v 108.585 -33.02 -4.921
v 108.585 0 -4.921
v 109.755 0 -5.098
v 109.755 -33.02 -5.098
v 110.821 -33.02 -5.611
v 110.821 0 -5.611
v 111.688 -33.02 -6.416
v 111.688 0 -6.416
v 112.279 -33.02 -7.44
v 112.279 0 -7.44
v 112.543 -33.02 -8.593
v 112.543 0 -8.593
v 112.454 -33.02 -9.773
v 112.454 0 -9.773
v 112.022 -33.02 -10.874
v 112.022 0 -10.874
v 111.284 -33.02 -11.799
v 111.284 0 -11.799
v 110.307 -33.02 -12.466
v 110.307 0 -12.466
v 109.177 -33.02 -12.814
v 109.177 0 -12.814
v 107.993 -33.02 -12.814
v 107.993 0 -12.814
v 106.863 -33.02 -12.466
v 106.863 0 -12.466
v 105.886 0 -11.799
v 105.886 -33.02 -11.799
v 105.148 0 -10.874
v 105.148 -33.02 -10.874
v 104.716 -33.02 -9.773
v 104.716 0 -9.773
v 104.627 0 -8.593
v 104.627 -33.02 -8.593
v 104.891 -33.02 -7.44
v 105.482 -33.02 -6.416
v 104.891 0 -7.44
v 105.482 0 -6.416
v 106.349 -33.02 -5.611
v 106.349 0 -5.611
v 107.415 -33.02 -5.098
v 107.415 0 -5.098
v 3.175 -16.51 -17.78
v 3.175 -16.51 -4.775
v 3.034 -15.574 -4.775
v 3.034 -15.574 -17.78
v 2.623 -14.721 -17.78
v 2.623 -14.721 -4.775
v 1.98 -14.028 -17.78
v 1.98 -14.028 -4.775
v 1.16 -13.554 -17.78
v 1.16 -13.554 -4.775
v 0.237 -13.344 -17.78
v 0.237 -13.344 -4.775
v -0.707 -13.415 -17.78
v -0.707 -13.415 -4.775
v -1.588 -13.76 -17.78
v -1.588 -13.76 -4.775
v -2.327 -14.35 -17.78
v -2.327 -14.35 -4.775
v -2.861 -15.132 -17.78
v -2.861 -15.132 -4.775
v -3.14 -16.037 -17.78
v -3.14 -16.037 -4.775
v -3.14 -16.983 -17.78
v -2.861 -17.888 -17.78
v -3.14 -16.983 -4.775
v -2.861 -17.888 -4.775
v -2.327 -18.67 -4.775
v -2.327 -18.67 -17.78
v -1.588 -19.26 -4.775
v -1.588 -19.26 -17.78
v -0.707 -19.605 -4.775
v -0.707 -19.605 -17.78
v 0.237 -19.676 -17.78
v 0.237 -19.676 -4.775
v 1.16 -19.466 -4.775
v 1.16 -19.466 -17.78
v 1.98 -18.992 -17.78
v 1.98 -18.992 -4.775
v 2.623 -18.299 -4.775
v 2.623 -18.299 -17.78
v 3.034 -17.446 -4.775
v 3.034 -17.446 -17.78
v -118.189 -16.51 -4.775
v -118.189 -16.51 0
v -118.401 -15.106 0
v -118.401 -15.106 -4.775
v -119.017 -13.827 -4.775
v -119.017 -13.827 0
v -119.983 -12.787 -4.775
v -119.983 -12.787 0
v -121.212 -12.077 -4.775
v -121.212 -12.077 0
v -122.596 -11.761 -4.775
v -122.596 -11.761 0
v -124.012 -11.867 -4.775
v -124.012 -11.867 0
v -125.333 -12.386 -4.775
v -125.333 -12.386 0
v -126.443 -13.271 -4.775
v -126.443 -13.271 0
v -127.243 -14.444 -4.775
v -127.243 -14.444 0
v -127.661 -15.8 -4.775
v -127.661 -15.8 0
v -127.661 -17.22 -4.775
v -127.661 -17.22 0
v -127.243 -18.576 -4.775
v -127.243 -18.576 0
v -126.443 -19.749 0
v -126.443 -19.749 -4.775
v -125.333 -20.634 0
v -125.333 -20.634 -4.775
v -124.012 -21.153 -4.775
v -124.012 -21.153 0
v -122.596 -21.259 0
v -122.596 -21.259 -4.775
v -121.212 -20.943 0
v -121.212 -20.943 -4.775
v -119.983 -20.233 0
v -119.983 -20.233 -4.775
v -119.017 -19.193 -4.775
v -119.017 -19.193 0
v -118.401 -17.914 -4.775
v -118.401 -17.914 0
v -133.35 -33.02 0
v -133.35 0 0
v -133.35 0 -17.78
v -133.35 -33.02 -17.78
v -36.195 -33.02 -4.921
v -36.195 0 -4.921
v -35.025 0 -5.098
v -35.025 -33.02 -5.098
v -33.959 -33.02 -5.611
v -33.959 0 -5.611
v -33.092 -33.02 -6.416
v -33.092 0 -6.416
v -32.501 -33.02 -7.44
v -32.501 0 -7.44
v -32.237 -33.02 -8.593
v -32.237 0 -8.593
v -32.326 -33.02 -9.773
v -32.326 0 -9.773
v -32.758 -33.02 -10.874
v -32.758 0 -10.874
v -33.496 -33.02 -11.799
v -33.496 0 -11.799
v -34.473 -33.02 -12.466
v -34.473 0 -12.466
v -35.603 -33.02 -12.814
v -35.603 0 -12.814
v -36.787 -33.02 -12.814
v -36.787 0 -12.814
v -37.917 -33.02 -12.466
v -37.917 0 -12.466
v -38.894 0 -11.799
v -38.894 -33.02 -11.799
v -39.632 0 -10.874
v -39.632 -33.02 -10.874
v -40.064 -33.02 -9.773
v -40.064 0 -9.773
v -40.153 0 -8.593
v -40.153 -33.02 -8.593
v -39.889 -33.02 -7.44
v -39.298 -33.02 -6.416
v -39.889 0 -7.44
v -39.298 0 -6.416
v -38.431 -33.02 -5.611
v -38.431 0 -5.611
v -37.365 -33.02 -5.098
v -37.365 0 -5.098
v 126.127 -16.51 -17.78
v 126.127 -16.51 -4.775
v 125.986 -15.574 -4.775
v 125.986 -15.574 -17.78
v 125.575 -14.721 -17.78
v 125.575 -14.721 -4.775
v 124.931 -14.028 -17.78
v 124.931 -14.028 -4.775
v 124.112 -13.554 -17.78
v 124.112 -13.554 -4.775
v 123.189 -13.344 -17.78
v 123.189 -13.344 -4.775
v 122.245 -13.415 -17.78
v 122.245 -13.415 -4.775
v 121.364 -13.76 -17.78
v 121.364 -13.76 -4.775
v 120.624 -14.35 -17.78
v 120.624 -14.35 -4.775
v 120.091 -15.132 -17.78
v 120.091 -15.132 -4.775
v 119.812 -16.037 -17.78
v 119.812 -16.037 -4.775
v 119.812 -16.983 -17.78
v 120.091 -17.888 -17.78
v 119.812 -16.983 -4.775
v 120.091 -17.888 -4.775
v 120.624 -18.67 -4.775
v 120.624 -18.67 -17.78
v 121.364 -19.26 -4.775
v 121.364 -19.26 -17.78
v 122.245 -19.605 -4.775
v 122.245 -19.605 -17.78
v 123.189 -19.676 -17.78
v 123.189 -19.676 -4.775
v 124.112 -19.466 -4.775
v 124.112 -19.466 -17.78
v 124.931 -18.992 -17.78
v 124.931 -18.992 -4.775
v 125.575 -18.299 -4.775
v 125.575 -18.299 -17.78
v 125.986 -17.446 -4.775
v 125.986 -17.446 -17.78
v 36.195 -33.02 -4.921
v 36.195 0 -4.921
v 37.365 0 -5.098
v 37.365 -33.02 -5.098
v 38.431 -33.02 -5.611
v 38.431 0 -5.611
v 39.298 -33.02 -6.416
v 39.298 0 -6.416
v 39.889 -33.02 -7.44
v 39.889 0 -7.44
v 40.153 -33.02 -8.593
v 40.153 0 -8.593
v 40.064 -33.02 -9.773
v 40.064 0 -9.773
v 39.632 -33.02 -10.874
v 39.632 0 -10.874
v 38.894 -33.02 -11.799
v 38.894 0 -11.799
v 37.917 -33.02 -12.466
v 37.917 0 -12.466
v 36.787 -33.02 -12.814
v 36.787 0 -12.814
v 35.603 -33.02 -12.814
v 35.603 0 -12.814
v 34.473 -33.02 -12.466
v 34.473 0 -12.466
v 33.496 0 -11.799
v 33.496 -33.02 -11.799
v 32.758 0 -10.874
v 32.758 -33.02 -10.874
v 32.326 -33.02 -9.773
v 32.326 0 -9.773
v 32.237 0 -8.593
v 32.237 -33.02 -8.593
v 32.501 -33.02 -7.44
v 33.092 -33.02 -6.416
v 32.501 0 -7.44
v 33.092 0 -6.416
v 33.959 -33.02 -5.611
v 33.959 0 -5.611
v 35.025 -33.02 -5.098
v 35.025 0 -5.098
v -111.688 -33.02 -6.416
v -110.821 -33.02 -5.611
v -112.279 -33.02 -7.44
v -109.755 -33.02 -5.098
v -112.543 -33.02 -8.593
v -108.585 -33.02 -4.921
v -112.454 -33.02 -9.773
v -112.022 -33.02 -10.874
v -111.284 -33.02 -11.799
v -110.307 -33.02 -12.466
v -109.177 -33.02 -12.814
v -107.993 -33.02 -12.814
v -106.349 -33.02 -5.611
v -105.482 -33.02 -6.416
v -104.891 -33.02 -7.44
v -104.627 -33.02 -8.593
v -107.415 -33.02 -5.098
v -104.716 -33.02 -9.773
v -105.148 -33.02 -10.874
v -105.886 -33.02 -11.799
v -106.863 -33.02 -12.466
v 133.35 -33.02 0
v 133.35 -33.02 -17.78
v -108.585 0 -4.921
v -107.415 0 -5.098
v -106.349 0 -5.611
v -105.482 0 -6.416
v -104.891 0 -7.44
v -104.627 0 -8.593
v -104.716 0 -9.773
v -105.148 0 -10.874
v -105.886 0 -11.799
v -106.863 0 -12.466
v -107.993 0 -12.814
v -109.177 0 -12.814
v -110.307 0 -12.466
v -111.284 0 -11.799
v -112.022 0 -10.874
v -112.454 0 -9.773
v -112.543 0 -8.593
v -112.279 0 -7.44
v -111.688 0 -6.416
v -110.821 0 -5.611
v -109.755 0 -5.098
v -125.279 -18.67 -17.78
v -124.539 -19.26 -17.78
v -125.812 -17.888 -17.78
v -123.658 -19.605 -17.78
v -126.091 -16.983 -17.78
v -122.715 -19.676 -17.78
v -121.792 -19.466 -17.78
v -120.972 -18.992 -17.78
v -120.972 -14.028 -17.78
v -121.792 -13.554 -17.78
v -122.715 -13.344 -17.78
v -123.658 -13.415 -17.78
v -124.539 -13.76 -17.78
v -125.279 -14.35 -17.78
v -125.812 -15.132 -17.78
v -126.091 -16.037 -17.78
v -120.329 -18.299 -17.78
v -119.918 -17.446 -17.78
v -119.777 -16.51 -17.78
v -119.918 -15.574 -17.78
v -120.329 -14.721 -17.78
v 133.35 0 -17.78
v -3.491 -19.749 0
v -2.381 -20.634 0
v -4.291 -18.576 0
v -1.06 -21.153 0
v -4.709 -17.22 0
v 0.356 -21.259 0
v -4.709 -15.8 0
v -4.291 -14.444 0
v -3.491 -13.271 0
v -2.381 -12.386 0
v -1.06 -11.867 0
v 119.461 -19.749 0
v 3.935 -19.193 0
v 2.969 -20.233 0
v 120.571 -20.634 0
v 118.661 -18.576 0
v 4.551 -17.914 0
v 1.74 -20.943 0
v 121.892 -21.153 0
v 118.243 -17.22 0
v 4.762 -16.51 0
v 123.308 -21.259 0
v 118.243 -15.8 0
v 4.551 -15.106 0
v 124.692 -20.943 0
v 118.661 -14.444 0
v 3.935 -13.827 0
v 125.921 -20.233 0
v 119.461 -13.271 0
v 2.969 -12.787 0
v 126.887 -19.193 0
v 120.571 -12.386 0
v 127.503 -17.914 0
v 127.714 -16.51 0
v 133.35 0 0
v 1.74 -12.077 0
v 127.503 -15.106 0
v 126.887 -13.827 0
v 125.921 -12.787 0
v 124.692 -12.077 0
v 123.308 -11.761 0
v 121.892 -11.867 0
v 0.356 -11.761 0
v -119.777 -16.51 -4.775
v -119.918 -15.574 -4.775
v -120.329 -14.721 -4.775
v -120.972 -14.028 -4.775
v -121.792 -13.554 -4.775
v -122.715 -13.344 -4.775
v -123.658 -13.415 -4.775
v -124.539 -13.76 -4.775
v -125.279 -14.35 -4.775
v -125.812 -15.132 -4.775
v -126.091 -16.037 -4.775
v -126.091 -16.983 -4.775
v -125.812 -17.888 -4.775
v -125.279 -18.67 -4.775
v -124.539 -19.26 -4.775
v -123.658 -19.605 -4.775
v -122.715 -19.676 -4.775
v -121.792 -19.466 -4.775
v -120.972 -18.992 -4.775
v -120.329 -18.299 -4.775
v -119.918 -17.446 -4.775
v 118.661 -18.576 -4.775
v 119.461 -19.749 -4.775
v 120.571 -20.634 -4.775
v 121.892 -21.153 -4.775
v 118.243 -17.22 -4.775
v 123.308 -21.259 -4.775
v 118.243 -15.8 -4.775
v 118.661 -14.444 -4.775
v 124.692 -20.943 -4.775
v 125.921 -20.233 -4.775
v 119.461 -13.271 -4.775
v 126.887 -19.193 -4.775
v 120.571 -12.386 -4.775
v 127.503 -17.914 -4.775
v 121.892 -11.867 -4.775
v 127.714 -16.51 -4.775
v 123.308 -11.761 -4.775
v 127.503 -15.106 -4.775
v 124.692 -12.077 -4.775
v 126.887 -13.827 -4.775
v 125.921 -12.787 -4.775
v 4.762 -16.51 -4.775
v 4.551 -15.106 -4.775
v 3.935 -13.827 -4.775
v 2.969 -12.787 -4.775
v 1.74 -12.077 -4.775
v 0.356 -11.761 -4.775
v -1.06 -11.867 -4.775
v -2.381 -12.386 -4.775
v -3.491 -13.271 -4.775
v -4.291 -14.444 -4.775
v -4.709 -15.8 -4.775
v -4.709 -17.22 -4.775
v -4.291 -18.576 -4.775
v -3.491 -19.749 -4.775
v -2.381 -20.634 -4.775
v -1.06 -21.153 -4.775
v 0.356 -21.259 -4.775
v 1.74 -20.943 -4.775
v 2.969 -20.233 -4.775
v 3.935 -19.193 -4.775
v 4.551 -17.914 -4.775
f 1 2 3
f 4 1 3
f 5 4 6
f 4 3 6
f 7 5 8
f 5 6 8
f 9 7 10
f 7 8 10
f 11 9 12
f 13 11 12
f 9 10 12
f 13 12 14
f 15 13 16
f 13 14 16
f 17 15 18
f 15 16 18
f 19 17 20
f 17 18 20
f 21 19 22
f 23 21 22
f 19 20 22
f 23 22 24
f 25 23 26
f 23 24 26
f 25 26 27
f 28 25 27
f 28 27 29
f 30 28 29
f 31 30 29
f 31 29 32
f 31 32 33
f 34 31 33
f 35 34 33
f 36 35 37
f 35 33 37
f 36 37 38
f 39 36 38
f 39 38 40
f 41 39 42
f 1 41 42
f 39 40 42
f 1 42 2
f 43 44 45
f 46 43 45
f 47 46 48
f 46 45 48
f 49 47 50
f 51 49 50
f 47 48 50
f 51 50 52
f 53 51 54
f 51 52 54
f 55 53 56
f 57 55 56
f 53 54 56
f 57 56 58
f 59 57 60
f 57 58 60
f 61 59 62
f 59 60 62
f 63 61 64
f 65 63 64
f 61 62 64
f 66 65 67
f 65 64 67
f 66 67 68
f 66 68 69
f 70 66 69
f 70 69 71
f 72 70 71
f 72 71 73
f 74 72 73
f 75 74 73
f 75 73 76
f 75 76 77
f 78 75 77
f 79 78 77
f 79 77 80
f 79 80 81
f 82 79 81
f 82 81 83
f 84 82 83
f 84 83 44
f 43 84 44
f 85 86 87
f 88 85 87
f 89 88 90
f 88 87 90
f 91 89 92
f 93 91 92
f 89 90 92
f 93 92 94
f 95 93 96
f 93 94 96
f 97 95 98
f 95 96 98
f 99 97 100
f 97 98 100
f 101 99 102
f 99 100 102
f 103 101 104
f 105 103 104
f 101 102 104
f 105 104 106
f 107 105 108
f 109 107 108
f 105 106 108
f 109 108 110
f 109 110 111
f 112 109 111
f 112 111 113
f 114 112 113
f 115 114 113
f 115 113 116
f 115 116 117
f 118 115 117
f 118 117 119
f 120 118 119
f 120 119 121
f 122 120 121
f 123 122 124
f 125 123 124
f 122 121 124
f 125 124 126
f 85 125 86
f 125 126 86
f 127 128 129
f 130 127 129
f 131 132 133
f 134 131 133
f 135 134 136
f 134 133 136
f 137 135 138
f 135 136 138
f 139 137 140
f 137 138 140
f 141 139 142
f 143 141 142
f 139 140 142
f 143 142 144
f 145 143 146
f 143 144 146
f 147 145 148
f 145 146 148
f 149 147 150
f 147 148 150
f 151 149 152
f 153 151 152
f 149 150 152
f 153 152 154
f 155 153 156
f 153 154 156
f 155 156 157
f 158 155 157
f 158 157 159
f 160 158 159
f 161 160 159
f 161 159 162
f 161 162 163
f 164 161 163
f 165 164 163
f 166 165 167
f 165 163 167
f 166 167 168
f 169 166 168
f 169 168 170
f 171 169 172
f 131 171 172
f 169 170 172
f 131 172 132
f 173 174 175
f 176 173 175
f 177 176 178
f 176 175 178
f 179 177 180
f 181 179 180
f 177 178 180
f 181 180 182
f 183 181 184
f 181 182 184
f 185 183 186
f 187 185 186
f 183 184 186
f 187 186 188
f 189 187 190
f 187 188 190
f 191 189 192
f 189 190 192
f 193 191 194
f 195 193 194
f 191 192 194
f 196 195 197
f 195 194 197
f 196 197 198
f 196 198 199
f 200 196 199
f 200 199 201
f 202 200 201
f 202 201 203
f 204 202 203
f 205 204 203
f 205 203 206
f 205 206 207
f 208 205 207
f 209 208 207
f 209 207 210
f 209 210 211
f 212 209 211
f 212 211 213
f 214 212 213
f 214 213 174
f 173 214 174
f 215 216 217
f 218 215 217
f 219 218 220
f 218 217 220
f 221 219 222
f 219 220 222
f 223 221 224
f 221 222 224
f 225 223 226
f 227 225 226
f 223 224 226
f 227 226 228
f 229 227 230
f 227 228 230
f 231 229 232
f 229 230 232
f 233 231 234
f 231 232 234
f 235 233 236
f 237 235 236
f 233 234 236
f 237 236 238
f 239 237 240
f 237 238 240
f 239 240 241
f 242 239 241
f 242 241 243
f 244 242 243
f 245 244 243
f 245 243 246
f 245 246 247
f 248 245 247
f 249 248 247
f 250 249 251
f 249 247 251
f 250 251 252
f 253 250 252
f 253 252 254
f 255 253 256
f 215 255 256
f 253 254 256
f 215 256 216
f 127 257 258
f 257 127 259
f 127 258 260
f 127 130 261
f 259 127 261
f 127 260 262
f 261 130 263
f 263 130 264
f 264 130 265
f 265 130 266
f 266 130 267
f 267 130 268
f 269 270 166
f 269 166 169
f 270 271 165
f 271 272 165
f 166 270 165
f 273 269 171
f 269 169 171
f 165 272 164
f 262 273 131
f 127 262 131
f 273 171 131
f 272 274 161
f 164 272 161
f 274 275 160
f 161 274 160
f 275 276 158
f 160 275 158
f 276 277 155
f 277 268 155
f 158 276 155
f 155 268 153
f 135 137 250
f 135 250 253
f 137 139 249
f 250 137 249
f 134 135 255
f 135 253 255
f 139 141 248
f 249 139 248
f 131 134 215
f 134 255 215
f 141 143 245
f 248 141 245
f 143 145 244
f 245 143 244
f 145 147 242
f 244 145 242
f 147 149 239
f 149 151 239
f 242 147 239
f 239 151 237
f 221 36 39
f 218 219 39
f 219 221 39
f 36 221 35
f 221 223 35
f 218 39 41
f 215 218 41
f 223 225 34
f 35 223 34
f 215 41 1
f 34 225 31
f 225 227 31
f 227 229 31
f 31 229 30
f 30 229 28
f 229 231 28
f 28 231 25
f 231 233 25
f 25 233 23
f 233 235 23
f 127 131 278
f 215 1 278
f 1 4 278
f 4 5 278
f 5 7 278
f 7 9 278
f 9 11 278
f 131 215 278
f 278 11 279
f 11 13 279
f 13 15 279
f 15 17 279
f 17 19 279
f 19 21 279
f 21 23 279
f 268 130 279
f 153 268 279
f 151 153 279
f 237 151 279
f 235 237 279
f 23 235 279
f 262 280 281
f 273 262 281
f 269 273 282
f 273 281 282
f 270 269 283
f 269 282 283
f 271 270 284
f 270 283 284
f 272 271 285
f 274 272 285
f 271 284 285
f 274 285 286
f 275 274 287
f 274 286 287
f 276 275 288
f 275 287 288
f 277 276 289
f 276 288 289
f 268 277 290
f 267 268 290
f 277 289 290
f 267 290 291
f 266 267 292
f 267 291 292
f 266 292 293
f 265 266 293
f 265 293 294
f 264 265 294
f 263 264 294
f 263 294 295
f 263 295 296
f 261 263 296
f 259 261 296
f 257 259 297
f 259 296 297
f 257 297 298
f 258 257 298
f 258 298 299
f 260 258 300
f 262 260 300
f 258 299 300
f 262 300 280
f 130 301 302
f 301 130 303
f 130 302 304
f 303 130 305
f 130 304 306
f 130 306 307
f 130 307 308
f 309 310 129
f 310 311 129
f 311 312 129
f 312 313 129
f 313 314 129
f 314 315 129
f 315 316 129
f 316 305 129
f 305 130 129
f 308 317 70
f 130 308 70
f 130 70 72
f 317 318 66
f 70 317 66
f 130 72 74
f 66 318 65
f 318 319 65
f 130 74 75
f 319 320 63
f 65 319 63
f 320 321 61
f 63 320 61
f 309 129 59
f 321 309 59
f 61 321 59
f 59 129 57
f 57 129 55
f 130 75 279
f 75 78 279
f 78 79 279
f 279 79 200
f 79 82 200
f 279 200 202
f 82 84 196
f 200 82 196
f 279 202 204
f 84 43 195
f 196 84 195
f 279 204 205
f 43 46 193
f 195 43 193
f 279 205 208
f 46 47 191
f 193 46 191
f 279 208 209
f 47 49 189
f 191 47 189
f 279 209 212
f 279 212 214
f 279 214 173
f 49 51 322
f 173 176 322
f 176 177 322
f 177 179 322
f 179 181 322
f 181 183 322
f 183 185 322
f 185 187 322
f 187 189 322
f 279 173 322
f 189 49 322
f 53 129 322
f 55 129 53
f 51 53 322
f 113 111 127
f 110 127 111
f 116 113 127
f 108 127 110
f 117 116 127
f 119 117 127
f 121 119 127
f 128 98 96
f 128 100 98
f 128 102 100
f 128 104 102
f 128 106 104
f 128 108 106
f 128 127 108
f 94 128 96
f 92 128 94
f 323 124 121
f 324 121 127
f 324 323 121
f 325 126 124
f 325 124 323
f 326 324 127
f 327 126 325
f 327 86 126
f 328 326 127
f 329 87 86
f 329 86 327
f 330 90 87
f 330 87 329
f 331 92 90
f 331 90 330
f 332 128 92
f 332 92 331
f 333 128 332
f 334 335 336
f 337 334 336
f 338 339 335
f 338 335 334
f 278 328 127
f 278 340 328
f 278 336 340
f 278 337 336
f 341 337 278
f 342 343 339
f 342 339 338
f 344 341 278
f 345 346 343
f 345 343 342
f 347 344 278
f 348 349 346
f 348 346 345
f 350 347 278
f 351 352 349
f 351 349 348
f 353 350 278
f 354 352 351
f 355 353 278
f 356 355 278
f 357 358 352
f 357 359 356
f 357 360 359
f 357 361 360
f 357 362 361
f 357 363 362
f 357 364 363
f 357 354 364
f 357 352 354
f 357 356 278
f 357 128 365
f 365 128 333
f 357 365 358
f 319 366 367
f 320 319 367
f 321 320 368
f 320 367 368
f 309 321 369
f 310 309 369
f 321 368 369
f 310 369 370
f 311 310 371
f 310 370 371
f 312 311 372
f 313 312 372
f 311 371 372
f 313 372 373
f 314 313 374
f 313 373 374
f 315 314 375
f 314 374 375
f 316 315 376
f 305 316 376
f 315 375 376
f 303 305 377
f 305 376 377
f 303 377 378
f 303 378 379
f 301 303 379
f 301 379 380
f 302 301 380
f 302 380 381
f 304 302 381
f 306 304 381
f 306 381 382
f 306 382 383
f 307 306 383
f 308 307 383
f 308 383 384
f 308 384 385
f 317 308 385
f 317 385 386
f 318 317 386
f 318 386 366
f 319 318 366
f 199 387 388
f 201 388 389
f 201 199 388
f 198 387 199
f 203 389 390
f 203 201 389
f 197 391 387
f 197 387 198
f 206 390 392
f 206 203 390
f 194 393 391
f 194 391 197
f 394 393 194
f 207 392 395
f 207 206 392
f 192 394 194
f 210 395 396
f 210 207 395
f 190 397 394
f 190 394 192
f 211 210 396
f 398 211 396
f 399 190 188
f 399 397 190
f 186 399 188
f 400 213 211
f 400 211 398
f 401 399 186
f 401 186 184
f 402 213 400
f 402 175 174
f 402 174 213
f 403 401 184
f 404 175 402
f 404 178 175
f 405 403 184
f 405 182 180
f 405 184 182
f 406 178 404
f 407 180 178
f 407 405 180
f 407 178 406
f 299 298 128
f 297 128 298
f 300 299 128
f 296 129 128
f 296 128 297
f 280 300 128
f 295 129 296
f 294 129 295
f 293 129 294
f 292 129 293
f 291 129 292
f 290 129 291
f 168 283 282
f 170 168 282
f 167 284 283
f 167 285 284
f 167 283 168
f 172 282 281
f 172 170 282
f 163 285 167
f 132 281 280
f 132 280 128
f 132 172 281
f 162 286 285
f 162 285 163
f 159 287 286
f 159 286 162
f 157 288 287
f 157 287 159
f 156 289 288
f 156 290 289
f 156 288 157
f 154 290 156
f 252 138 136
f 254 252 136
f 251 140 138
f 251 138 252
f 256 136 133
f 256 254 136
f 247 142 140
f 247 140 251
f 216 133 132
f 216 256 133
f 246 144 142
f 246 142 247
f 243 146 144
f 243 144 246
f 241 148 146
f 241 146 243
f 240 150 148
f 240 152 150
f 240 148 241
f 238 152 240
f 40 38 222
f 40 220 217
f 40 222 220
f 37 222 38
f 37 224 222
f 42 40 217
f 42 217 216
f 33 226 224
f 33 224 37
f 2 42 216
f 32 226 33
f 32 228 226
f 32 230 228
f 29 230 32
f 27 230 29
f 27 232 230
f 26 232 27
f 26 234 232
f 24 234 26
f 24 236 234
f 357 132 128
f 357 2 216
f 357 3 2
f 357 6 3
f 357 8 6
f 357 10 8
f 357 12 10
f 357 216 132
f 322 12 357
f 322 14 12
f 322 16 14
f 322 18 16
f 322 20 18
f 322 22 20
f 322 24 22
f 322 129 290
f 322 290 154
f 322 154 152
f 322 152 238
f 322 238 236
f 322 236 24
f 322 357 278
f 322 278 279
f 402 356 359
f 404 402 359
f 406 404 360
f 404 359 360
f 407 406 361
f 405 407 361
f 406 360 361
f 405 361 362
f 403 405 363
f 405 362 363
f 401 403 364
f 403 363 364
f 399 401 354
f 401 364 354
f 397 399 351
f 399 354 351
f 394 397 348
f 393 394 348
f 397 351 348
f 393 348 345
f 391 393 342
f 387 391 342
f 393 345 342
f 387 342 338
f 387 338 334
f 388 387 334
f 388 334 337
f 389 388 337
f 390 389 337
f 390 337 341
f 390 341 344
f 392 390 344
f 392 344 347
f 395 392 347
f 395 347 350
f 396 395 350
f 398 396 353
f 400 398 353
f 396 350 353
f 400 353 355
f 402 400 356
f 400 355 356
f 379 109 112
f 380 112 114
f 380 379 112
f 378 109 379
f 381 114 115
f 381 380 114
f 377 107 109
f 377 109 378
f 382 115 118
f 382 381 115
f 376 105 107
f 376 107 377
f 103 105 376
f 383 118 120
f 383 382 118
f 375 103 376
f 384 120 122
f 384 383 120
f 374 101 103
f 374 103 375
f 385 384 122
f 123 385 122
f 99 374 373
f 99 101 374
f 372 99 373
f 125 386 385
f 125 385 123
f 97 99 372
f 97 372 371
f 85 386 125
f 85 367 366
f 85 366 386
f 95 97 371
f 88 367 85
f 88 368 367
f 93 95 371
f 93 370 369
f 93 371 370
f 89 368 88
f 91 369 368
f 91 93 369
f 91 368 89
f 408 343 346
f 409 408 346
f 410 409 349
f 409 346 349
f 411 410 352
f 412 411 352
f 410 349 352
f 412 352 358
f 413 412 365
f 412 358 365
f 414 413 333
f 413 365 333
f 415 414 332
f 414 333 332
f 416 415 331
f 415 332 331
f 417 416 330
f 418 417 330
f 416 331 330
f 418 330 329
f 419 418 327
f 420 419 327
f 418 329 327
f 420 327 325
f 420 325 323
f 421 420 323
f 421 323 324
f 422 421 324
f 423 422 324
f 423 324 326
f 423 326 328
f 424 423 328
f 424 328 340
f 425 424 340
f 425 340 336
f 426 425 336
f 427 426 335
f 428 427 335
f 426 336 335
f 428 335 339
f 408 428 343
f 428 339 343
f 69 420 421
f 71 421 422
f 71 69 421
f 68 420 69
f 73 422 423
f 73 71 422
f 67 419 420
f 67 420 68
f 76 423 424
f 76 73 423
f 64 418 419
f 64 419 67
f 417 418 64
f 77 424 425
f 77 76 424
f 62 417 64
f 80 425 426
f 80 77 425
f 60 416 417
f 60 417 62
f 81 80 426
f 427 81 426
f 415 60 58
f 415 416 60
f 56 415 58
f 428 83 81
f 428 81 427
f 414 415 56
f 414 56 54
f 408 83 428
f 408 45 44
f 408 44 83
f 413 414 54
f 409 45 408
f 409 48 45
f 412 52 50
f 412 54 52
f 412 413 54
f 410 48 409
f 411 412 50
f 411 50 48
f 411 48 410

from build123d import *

# Parameters (mm, degrees)
SKETCH1_W           = 266.7
SKETCH1_H           = 17.78
SKETCH1_R           = 3.96875
BOSS_EXTRUDE1_DEPTH = 33.02
SKETCH2_R           = 3.175
CUT_EXTRUDE1_DEPTH  = 17.78
SKETCH3_R           = 4.7625
CUT_EXTRUDE2_DEPTH  = 4.7752


with BuildPart() as part:
    # Sketch1 → Boss-Extrude1 (new body)
    with BuildSketch(Plane(origin=(0, 0, 0), x_dir=(1, 0, 0), z_dir=(0, 1, 0))):
        with Locations((0, 8.89)):
            Rectangle(SKETCH1_W, SKETCH1_H)
        with Locations(Location((108.585, 8.89, 0), (0, 0, 270))):
            Circle(SKETCH1_R, mode=Mode.SUBTRACT)
        with Locations(Location((36.195, 8.89, 0), (0, 0, 270))):
            Circle(SKETCH1_R, mode=Mode.SUBTRACT)
        with Locations(Location((-36.195, 8.89, 0), (0, 0, 270))):
            Circle(SKETCH1_R, mode=Mode.SUBTRACT)
        with Locations(Location((-108.585, 8.89, 0), (0, 0, 270))):
            Circle(SKETCH1_R, mode=Mode.SUBTRACT)
    extrude(amount=-BOSS_EXTRUDE1_DEPTH)

    # Sketch2 → Cut-Extrude1 (cut)
    with BuildSketch(Plane.XY):
        with Locations((122.951875, -16.51)):
            Circle(SKETCH2_R)
        with Locations((0, -16.51)):
            Circle(SKETCH2_R)
        with Locations((-122.951875, -16.51)):
            Circle(SKETCH2_R)
    extrude(amount=-CUT_EXTRUDE1_DEPTH, mode=Mode.SUBTRACT)

    # Sketch3 → Cut-Extrude2 (cut)
    with BuildSketch(Plane.XY):
        with Locations((122.951875, -16.51)):
            Circle(SKETCH3_R)
        with Locations((0, -16.51)):
            Circle(SKETCH3_R)
        with Locations((-122.951875, -16.51)):
            Circle(SKETCH3_R)
    extrude(amount=-CUT_EXTRUDE2_DEPTH, mode=Mode.SUBTRACT)


solid = part.part
